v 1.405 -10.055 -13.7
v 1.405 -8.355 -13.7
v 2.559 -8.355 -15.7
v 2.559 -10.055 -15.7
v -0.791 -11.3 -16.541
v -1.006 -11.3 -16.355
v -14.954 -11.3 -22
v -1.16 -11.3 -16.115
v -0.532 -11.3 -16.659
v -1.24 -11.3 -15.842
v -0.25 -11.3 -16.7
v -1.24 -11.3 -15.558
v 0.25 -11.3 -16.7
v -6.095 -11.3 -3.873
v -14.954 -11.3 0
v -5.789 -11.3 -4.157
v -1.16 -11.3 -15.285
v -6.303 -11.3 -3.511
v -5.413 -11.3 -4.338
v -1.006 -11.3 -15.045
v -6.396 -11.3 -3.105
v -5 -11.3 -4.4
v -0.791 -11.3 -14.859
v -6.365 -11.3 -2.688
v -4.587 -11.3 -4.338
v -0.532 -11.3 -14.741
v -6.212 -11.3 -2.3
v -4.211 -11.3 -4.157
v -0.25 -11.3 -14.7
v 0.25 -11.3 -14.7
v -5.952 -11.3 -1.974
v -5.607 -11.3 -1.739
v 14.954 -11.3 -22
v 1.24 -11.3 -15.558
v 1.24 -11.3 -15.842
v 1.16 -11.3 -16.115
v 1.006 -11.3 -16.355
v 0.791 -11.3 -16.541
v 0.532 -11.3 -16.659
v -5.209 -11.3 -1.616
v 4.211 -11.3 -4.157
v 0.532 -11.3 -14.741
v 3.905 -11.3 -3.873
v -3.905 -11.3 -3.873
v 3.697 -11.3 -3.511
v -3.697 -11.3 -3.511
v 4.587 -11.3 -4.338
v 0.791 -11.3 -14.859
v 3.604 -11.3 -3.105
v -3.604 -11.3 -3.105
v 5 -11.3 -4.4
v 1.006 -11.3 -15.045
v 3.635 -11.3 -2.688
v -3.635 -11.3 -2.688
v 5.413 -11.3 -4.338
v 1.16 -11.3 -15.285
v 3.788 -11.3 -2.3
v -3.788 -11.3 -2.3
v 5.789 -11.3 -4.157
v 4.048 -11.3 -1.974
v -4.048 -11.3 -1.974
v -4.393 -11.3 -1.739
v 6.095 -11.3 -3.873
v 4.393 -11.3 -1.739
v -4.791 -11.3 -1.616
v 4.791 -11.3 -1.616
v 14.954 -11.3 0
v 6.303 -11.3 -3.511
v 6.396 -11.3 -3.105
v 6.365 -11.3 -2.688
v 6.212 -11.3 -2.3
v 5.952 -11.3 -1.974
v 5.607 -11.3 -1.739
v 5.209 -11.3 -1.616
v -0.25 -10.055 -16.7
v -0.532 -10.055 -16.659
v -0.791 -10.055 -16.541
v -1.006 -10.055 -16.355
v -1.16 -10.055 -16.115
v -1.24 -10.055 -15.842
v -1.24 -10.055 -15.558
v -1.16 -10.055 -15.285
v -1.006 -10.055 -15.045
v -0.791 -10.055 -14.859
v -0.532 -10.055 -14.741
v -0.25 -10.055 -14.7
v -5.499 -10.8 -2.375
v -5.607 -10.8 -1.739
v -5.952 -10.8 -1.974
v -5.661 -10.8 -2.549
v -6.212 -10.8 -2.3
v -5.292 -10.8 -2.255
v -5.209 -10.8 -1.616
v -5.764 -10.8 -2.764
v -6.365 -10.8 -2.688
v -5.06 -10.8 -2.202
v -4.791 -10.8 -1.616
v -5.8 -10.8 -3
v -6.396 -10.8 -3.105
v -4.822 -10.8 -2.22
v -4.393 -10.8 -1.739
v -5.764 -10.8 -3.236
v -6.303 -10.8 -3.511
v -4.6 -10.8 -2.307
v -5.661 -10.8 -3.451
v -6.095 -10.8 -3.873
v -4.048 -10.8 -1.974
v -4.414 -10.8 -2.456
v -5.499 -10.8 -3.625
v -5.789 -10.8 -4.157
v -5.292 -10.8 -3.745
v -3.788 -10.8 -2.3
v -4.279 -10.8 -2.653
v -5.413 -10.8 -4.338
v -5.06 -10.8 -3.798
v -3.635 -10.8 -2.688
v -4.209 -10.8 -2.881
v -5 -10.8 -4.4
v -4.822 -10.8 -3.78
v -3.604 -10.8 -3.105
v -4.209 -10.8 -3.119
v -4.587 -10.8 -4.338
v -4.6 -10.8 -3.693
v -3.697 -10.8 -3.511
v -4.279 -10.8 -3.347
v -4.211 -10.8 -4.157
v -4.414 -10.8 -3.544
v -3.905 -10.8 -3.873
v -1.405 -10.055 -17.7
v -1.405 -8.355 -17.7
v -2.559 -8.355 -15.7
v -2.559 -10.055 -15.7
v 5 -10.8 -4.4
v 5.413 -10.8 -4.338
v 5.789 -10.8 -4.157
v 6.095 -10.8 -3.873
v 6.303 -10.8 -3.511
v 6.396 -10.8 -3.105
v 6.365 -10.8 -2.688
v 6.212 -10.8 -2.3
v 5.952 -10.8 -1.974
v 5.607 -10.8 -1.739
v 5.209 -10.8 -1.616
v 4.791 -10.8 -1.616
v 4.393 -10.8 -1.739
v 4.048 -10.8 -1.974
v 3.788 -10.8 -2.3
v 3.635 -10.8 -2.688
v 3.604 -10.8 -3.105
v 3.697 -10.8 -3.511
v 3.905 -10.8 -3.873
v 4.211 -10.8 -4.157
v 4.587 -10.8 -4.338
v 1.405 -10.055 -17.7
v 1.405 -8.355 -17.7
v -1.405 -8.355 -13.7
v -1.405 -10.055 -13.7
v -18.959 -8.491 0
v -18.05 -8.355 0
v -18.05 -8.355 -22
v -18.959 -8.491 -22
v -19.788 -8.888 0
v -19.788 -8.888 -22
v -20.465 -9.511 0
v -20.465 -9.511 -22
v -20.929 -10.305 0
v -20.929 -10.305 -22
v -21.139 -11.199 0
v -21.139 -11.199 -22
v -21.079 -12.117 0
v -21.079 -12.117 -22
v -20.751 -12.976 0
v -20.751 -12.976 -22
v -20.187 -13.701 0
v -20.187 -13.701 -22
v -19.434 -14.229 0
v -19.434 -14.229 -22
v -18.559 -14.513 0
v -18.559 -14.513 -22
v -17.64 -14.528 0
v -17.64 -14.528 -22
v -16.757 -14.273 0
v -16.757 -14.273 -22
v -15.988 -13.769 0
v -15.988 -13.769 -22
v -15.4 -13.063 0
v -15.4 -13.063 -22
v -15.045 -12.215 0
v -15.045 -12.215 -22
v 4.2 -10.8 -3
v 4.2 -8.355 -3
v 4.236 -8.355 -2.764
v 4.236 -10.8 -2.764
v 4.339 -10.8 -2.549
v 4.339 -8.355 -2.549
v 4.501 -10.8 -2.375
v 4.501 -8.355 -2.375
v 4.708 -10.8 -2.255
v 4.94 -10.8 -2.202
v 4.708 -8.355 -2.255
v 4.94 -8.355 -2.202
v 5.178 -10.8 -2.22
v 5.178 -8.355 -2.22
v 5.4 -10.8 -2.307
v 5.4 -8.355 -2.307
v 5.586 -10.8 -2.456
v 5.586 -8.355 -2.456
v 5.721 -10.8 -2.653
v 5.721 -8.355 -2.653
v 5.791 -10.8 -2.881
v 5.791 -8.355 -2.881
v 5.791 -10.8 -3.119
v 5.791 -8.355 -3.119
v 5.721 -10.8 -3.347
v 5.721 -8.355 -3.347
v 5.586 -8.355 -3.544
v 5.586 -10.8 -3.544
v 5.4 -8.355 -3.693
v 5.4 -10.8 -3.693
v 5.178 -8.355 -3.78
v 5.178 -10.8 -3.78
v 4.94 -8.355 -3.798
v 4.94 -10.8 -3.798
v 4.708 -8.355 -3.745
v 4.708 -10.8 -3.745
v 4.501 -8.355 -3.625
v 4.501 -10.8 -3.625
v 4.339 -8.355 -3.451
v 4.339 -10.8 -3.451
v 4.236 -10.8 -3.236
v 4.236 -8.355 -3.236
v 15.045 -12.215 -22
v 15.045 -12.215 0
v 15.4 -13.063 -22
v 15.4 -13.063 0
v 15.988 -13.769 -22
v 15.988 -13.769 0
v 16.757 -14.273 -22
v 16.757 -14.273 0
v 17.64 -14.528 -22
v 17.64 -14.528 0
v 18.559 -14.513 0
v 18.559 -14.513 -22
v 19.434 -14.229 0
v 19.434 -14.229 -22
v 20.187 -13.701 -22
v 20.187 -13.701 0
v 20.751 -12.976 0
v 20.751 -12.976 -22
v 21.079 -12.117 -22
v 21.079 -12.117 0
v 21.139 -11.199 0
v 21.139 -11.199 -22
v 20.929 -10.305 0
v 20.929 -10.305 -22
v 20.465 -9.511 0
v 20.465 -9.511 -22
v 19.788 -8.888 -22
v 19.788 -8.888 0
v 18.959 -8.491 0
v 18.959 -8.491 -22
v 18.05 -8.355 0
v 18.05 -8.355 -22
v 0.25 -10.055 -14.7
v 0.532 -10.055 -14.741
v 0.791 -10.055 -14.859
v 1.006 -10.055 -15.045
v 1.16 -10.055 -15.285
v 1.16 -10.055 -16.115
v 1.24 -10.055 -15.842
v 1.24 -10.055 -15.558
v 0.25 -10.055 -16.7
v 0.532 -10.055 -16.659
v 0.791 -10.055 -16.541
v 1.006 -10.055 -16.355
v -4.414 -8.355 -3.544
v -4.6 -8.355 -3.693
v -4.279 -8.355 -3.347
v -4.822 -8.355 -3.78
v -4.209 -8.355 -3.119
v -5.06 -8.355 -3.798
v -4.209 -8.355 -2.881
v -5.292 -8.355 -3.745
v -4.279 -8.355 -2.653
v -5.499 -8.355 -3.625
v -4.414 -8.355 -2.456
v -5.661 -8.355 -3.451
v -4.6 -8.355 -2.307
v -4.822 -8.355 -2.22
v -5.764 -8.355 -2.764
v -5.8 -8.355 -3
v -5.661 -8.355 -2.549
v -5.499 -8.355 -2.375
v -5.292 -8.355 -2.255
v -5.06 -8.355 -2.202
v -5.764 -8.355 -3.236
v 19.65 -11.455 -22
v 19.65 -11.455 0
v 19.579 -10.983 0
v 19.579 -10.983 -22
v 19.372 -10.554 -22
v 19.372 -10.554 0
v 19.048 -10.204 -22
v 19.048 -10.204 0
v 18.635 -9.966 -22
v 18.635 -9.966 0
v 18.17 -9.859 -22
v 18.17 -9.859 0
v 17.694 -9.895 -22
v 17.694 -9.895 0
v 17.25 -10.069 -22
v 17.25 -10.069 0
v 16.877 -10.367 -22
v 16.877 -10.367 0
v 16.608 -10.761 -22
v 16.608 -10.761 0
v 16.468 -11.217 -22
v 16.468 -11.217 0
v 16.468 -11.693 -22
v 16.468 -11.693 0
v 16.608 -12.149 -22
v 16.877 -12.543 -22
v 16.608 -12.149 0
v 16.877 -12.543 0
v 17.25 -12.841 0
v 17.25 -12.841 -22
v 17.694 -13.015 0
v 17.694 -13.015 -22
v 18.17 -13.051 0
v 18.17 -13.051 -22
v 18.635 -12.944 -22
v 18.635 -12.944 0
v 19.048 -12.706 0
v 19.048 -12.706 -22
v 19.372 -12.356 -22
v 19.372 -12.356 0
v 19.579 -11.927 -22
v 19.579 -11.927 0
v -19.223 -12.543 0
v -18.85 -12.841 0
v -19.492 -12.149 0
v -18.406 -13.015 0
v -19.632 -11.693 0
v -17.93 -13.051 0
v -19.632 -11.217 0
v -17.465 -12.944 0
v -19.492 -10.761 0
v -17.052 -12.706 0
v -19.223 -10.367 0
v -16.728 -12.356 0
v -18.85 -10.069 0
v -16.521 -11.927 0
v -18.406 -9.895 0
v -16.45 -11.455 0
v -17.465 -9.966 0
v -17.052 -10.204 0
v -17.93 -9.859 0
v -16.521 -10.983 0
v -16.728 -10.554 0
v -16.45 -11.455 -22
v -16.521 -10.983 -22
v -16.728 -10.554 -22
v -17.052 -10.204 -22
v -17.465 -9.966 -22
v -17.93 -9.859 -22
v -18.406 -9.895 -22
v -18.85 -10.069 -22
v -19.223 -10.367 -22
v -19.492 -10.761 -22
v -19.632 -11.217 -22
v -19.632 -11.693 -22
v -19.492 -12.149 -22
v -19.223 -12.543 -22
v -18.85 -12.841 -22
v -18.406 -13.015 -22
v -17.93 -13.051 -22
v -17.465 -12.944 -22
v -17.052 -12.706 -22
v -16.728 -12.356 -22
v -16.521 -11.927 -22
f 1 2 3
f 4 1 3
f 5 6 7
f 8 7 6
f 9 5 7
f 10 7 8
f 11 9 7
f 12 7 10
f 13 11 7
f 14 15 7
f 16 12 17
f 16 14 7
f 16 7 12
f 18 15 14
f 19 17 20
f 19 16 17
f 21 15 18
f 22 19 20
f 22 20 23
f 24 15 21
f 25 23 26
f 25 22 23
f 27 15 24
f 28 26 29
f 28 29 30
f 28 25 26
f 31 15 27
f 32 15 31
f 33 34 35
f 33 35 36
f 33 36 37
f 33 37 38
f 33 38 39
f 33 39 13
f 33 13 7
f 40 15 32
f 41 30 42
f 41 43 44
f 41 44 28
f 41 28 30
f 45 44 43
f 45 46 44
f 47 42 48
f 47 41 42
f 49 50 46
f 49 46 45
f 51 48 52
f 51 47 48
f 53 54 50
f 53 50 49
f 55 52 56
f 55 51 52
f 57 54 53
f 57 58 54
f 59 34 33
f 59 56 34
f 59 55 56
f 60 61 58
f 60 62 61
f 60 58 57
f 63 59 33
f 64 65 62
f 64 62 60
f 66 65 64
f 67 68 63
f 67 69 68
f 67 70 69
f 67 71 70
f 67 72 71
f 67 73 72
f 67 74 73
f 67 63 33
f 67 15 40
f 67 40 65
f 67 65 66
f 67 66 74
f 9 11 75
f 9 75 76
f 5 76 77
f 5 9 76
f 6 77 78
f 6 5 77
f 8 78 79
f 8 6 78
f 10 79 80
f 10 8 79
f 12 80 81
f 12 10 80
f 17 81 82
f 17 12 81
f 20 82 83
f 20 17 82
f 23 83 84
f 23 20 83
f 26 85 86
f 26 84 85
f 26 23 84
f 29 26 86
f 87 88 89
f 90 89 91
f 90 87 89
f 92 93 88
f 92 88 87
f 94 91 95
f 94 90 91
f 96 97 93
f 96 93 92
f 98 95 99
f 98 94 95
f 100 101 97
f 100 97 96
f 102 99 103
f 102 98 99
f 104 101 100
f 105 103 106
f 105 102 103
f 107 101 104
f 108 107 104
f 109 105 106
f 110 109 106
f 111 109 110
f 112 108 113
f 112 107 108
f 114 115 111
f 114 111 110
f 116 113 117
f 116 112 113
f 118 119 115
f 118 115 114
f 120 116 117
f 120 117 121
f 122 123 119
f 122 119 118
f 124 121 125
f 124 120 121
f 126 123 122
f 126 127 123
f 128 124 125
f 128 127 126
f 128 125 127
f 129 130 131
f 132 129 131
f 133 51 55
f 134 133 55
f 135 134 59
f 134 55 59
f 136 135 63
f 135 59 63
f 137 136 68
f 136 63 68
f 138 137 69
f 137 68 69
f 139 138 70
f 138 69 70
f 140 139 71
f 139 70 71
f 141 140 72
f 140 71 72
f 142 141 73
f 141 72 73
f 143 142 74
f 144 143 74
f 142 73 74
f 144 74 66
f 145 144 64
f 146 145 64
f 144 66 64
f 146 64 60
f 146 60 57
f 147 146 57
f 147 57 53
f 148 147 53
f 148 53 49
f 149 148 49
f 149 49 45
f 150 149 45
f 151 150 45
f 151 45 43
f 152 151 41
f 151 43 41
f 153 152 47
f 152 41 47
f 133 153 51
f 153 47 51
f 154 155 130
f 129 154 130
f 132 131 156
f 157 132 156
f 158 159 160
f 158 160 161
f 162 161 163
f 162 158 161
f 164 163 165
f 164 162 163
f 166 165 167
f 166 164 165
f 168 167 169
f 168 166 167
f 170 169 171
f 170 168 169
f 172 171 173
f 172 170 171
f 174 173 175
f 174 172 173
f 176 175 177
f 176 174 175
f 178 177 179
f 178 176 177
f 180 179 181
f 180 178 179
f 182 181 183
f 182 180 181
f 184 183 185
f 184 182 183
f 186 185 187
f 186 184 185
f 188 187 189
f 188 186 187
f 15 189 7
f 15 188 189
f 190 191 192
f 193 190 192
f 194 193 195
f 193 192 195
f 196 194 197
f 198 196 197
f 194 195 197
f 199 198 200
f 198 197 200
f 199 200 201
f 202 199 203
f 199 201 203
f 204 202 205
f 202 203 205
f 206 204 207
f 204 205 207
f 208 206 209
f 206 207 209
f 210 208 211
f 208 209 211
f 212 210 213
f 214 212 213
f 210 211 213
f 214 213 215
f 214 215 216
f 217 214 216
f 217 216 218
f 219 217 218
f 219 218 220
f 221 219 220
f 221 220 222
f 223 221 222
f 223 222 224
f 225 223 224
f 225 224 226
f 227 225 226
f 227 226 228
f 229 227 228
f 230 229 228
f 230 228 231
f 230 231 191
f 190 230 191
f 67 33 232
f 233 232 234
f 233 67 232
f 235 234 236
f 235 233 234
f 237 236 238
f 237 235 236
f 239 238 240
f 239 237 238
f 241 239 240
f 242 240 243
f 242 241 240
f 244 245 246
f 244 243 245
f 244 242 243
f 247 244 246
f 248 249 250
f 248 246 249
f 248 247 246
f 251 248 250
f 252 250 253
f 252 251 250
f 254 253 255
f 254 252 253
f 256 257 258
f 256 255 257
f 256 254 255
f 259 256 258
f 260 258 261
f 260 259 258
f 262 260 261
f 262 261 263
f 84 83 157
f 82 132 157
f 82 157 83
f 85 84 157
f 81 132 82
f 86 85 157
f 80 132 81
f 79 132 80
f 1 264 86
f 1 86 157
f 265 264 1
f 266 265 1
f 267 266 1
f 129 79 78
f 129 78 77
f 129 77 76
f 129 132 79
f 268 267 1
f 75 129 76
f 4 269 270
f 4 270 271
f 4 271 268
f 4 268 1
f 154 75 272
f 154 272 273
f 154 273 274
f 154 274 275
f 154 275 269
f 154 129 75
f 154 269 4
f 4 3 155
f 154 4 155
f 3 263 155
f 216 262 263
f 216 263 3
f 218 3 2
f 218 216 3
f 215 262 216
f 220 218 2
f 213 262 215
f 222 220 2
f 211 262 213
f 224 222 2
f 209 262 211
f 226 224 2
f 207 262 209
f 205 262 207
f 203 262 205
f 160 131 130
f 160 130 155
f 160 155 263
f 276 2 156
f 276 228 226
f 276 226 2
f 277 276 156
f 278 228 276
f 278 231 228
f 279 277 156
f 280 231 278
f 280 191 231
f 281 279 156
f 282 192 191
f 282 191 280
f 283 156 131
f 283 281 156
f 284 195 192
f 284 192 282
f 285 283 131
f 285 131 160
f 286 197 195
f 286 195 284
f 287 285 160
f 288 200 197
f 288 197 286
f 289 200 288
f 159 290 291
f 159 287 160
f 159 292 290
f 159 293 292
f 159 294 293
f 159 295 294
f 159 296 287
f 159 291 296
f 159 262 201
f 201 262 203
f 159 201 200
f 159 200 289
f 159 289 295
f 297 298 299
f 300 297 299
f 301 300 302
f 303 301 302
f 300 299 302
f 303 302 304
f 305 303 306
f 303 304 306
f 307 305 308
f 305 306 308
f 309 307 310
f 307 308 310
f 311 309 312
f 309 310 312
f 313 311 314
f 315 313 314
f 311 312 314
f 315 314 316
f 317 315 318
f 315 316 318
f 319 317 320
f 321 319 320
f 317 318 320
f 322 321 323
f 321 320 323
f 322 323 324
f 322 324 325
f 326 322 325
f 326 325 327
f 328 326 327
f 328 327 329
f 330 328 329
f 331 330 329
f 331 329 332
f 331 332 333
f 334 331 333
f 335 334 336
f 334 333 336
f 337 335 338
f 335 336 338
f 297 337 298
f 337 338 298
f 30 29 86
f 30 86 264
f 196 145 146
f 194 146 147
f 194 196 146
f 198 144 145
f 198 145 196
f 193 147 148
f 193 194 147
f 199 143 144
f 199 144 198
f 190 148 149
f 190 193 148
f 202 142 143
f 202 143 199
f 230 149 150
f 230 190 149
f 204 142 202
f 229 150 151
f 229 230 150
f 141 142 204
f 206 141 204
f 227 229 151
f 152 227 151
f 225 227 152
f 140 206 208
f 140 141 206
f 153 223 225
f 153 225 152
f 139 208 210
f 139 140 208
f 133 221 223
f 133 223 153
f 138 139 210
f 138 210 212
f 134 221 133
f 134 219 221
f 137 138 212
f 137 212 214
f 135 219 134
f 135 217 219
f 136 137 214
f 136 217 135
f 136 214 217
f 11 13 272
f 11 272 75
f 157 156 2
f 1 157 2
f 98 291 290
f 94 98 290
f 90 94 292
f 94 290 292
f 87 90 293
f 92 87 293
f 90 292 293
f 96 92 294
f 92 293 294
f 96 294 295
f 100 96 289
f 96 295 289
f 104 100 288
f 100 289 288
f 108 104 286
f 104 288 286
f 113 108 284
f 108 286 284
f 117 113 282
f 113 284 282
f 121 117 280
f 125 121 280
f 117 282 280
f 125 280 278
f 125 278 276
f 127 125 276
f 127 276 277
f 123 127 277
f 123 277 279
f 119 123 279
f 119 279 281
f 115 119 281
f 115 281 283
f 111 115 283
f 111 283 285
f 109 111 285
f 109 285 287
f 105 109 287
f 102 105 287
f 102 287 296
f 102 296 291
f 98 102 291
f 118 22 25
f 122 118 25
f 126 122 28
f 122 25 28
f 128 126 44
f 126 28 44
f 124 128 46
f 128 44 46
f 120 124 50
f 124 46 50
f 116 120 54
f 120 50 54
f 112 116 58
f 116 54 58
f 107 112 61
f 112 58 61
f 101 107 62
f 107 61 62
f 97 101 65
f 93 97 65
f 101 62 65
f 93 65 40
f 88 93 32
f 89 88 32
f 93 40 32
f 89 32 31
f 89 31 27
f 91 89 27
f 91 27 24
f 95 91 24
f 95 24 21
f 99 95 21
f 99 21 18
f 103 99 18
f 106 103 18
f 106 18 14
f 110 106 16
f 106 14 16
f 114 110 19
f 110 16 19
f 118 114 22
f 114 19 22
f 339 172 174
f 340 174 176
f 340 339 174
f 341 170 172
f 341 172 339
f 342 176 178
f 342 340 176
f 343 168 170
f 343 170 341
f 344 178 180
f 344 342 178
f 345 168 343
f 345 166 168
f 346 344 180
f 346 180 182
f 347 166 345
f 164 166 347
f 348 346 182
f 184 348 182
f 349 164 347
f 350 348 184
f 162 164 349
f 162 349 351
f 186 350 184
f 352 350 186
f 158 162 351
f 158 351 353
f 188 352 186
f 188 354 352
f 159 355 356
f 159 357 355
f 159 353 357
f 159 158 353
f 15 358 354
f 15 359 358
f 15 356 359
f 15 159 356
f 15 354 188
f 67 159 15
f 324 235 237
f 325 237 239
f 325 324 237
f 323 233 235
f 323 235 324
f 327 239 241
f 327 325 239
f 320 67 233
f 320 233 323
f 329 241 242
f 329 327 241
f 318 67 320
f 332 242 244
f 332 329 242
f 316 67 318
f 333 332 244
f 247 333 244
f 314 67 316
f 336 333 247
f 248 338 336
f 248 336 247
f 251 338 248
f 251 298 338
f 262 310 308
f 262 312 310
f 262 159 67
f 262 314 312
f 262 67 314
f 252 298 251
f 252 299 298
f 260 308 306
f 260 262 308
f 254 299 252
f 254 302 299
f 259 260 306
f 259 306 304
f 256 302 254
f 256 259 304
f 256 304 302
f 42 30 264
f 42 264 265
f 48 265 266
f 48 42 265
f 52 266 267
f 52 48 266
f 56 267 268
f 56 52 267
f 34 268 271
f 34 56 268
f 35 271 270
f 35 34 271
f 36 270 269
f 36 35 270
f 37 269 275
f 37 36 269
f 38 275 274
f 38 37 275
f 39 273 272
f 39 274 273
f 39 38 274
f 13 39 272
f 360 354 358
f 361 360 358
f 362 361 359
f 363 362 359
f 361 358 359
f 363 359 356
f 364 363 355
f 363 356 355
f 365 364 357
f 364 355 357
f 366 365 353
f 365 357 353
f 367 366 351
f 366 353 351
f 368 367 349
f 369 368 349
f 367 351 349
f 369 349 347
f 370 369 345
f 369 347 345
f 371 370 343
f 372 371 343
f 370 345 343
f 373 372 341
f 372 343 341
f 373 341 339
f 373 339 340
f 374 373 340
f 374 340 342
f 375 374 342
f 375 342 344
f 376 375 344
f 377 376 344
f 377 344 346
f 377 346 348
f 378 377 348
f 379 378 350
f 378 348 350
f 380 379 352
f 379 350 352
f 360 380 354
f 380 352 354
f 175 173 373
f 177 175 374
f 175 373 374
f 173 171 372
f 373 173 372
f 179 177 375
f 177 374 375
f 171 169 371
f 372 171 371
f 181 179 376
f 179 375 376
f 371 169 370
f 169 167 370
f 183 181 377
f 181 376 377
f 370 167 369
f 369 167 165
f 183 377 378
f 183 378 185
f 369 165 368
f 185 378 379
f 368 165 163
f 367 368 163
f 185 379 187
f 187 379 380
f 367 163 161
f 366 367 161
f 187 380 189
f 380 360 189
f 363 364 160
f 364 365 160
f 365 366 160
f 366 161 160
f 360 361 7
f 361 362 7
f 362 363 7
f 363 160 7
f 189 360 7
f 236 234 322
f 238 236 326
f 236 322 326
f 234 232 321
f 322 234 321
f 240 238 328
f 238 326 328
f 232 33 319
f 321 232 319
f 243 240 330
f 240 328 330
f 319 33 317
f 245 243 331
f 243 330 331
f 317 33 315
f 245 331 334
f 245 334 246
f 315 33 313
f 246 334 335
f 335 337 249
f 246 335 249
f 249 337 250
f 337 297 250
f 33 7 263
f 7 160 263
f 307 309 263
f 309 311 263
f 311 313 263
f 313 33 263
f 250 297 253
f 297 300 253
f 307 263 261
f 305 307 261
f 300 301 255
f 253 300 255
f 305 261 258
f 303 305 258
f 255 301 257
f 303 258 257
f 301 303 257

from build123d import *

# Parameters (mm, degrees)
SKETCH_3_R          = 3.1
SKETCH_3_R_2        = 1.6
EXTRUDE_1_DEPTH     = 22
CUT_EXTRUDE_1_REACH = 32.691
CUT_EXTRUDE_2_DEPTH = 1.7
CUT_EXTRUDE_3_REACH = 33.141
SKETCH_6_R          = 0.8
SKETCH_7_R          = 1.4
CUT_EXTRUDE_4_DEPTH = 0.5


with BuildPart() as part:
    # 草图3 → 凸台-拉伸1 (new body)
    # profile 1 of 3: a face of its own
    with BuildSketch(Plane.XY):
        with Locations((18.05, -11.455)):
            Circle(SKETCH_3_R)
        with Locations((18.05, -11.455)):
            Circle(SKETCH_3_R_2, mode=Mode.SUBTRACT)
    # profile 2 of 3: a face of its own
    with BuildSketch(Plane.XY):
        with BuildLine():
            Line((18.05, -8.355), (-18.05, -8.355))
            ThreePointArc((-18.05, -8.355), (-15.913472443, -9.208836604), (-14.953877425, -11.3))
            Line((-14.953877425, -11.3), (14.953877425, -11.3))
            ThreePointArc((14.953877425, -11.3), (15.913472443, -9.208836604), (18.05, -8.355))
        make_face()
    # profile 3 of 3: a face of its own
    with BuildSketch(Plane.XY):
        with Locations((-18.05, -11.455)):
            Circle(SKETCH_3_R)
        with Locations((-18.05, -11.455)):
            Circle(SKETCH_3_R_2, mode=Mode.SUBTRACT)
    extrude(amount=-EXTRUDE_1_DEPTH)

    # 草图4 → 切除-拉伸1 (cut, up to next)
    with BuildSketch(Plane.XZ.offset(11.3), mode=Mode.PRIVATE) as cut_extrude_1_sk1:
        with BuildLine():
            Line((-0.25, -14.7), (0.25, -14.7))
            ThreePointArc((0.25, -14.7), (1.25, -15.7), (0.25, -16.7))
            Line((0.25, -16.7), (-0.25, -16.7))
            ThreePointArc((-0.25, -16.7), (-1.25, -15.7), (-0.25, -14.7))
        make_face()
    cut_extrude_1_tool1 = extrude(cut_extrude_1_sk1.sketch, amount=-CUT_EXTRUDE_1_REACH, mode=Mode.PRIVATE) & part.part
    add(cut_extrude_1_tool1.solids().sort_by_distance((0, -11.3, -15.7))[0], mode=Mode.SUBTRACT)

    # 草图5 → 切除-拉伸2 (cut)
    with BuildSketch(Plane(origin=(0, -8.355, 0), x_dir=(1, 0, 0), z_dir=(0, 1, 0))):
        Polygon((2.059401077, 15.7), (0.904700538, 17.7), (-1.404700538, 17.7), (-2.559401077, 15.7), (-1.404700538, 13.7), (0.904700538, 13.7), align=None)
        Polygon((2.559401077, 15.7), (1.404700538, 17.7), (-0.904700538, 17.7), (-2.059401077, 15.7), (-0.904700538, 13.7), (1.404700538, 13.7), align=None)
    extrude(amount=-CUT_EXTRUDE_2_DEPTH, mode=Mode.SUBTRACT)

    # 草图6 → 切除-拉伸3 (cut, up to next)
    with BuildSketch(Plane(origin=(0, -8.355, 0), x_dir=(1, 0, 0), z_dir=(0, 1, 0)), mode=Mode.PRIVATE) as cut_extrude_3_sk1:
        with Locations(Location((-5, 3, 0), (0, 0, 180))):
            Circle(SKETCH_6_R)
    cut_extrude_3_tool1 = extrude(cut_extrude_3_sk1.sketch, amount=-CUT_EXTRUDE_3_REACH, mode=Mode.PRIVATE) & part.part
    # 草图6 → 切除-拉伸3 (cut, up to next)
    with BuildSketch(Plane(origin=(0, -8.355, 0), x_dir=(1, 0, 0), z_dir=(0, 1, 0)), mode=Mode.PRIVATE) as cut_extrude_3_sk2:
        with Locations(Location((5, 3, 0), (0, 0, 180))):
            Circle(SKETCH_6_R)
    cut_extrude_3_tool2 = extrude(cut_extrude_3_sk2.sketch, amount=-CUT_EXTRUDE_3_REACH, mode=Mode.PRIVATE) & part.part
    add(cut_extrude_3_tool1.solids().sort_by_distance((-5, -8.355, -3))[0], mode=Mode.SUBTRACT)
    add(cut_extrude_3_tool2.solids().sort_by_distance((5, -8.355, -3))[0], mode=Mode.SUBTRACT)

    # 草图7 → 切除-拉伸4 (cut)
    with BuildSketch(Plane.XZ.offset(11.3)):
        with Locations(Location((5, -3, 0), (0, 0, 270))):
            Circle(SKETCH_7_R)
        with Locations(Location((-5, -3, 0), (0, 0, 270))):
            Circle(SKETCH_7_R)
    extrude(amount=-CUT_EXTRUDE_4_DEPTH, mode=Mode.SUBTRACT)


solid = part.part
